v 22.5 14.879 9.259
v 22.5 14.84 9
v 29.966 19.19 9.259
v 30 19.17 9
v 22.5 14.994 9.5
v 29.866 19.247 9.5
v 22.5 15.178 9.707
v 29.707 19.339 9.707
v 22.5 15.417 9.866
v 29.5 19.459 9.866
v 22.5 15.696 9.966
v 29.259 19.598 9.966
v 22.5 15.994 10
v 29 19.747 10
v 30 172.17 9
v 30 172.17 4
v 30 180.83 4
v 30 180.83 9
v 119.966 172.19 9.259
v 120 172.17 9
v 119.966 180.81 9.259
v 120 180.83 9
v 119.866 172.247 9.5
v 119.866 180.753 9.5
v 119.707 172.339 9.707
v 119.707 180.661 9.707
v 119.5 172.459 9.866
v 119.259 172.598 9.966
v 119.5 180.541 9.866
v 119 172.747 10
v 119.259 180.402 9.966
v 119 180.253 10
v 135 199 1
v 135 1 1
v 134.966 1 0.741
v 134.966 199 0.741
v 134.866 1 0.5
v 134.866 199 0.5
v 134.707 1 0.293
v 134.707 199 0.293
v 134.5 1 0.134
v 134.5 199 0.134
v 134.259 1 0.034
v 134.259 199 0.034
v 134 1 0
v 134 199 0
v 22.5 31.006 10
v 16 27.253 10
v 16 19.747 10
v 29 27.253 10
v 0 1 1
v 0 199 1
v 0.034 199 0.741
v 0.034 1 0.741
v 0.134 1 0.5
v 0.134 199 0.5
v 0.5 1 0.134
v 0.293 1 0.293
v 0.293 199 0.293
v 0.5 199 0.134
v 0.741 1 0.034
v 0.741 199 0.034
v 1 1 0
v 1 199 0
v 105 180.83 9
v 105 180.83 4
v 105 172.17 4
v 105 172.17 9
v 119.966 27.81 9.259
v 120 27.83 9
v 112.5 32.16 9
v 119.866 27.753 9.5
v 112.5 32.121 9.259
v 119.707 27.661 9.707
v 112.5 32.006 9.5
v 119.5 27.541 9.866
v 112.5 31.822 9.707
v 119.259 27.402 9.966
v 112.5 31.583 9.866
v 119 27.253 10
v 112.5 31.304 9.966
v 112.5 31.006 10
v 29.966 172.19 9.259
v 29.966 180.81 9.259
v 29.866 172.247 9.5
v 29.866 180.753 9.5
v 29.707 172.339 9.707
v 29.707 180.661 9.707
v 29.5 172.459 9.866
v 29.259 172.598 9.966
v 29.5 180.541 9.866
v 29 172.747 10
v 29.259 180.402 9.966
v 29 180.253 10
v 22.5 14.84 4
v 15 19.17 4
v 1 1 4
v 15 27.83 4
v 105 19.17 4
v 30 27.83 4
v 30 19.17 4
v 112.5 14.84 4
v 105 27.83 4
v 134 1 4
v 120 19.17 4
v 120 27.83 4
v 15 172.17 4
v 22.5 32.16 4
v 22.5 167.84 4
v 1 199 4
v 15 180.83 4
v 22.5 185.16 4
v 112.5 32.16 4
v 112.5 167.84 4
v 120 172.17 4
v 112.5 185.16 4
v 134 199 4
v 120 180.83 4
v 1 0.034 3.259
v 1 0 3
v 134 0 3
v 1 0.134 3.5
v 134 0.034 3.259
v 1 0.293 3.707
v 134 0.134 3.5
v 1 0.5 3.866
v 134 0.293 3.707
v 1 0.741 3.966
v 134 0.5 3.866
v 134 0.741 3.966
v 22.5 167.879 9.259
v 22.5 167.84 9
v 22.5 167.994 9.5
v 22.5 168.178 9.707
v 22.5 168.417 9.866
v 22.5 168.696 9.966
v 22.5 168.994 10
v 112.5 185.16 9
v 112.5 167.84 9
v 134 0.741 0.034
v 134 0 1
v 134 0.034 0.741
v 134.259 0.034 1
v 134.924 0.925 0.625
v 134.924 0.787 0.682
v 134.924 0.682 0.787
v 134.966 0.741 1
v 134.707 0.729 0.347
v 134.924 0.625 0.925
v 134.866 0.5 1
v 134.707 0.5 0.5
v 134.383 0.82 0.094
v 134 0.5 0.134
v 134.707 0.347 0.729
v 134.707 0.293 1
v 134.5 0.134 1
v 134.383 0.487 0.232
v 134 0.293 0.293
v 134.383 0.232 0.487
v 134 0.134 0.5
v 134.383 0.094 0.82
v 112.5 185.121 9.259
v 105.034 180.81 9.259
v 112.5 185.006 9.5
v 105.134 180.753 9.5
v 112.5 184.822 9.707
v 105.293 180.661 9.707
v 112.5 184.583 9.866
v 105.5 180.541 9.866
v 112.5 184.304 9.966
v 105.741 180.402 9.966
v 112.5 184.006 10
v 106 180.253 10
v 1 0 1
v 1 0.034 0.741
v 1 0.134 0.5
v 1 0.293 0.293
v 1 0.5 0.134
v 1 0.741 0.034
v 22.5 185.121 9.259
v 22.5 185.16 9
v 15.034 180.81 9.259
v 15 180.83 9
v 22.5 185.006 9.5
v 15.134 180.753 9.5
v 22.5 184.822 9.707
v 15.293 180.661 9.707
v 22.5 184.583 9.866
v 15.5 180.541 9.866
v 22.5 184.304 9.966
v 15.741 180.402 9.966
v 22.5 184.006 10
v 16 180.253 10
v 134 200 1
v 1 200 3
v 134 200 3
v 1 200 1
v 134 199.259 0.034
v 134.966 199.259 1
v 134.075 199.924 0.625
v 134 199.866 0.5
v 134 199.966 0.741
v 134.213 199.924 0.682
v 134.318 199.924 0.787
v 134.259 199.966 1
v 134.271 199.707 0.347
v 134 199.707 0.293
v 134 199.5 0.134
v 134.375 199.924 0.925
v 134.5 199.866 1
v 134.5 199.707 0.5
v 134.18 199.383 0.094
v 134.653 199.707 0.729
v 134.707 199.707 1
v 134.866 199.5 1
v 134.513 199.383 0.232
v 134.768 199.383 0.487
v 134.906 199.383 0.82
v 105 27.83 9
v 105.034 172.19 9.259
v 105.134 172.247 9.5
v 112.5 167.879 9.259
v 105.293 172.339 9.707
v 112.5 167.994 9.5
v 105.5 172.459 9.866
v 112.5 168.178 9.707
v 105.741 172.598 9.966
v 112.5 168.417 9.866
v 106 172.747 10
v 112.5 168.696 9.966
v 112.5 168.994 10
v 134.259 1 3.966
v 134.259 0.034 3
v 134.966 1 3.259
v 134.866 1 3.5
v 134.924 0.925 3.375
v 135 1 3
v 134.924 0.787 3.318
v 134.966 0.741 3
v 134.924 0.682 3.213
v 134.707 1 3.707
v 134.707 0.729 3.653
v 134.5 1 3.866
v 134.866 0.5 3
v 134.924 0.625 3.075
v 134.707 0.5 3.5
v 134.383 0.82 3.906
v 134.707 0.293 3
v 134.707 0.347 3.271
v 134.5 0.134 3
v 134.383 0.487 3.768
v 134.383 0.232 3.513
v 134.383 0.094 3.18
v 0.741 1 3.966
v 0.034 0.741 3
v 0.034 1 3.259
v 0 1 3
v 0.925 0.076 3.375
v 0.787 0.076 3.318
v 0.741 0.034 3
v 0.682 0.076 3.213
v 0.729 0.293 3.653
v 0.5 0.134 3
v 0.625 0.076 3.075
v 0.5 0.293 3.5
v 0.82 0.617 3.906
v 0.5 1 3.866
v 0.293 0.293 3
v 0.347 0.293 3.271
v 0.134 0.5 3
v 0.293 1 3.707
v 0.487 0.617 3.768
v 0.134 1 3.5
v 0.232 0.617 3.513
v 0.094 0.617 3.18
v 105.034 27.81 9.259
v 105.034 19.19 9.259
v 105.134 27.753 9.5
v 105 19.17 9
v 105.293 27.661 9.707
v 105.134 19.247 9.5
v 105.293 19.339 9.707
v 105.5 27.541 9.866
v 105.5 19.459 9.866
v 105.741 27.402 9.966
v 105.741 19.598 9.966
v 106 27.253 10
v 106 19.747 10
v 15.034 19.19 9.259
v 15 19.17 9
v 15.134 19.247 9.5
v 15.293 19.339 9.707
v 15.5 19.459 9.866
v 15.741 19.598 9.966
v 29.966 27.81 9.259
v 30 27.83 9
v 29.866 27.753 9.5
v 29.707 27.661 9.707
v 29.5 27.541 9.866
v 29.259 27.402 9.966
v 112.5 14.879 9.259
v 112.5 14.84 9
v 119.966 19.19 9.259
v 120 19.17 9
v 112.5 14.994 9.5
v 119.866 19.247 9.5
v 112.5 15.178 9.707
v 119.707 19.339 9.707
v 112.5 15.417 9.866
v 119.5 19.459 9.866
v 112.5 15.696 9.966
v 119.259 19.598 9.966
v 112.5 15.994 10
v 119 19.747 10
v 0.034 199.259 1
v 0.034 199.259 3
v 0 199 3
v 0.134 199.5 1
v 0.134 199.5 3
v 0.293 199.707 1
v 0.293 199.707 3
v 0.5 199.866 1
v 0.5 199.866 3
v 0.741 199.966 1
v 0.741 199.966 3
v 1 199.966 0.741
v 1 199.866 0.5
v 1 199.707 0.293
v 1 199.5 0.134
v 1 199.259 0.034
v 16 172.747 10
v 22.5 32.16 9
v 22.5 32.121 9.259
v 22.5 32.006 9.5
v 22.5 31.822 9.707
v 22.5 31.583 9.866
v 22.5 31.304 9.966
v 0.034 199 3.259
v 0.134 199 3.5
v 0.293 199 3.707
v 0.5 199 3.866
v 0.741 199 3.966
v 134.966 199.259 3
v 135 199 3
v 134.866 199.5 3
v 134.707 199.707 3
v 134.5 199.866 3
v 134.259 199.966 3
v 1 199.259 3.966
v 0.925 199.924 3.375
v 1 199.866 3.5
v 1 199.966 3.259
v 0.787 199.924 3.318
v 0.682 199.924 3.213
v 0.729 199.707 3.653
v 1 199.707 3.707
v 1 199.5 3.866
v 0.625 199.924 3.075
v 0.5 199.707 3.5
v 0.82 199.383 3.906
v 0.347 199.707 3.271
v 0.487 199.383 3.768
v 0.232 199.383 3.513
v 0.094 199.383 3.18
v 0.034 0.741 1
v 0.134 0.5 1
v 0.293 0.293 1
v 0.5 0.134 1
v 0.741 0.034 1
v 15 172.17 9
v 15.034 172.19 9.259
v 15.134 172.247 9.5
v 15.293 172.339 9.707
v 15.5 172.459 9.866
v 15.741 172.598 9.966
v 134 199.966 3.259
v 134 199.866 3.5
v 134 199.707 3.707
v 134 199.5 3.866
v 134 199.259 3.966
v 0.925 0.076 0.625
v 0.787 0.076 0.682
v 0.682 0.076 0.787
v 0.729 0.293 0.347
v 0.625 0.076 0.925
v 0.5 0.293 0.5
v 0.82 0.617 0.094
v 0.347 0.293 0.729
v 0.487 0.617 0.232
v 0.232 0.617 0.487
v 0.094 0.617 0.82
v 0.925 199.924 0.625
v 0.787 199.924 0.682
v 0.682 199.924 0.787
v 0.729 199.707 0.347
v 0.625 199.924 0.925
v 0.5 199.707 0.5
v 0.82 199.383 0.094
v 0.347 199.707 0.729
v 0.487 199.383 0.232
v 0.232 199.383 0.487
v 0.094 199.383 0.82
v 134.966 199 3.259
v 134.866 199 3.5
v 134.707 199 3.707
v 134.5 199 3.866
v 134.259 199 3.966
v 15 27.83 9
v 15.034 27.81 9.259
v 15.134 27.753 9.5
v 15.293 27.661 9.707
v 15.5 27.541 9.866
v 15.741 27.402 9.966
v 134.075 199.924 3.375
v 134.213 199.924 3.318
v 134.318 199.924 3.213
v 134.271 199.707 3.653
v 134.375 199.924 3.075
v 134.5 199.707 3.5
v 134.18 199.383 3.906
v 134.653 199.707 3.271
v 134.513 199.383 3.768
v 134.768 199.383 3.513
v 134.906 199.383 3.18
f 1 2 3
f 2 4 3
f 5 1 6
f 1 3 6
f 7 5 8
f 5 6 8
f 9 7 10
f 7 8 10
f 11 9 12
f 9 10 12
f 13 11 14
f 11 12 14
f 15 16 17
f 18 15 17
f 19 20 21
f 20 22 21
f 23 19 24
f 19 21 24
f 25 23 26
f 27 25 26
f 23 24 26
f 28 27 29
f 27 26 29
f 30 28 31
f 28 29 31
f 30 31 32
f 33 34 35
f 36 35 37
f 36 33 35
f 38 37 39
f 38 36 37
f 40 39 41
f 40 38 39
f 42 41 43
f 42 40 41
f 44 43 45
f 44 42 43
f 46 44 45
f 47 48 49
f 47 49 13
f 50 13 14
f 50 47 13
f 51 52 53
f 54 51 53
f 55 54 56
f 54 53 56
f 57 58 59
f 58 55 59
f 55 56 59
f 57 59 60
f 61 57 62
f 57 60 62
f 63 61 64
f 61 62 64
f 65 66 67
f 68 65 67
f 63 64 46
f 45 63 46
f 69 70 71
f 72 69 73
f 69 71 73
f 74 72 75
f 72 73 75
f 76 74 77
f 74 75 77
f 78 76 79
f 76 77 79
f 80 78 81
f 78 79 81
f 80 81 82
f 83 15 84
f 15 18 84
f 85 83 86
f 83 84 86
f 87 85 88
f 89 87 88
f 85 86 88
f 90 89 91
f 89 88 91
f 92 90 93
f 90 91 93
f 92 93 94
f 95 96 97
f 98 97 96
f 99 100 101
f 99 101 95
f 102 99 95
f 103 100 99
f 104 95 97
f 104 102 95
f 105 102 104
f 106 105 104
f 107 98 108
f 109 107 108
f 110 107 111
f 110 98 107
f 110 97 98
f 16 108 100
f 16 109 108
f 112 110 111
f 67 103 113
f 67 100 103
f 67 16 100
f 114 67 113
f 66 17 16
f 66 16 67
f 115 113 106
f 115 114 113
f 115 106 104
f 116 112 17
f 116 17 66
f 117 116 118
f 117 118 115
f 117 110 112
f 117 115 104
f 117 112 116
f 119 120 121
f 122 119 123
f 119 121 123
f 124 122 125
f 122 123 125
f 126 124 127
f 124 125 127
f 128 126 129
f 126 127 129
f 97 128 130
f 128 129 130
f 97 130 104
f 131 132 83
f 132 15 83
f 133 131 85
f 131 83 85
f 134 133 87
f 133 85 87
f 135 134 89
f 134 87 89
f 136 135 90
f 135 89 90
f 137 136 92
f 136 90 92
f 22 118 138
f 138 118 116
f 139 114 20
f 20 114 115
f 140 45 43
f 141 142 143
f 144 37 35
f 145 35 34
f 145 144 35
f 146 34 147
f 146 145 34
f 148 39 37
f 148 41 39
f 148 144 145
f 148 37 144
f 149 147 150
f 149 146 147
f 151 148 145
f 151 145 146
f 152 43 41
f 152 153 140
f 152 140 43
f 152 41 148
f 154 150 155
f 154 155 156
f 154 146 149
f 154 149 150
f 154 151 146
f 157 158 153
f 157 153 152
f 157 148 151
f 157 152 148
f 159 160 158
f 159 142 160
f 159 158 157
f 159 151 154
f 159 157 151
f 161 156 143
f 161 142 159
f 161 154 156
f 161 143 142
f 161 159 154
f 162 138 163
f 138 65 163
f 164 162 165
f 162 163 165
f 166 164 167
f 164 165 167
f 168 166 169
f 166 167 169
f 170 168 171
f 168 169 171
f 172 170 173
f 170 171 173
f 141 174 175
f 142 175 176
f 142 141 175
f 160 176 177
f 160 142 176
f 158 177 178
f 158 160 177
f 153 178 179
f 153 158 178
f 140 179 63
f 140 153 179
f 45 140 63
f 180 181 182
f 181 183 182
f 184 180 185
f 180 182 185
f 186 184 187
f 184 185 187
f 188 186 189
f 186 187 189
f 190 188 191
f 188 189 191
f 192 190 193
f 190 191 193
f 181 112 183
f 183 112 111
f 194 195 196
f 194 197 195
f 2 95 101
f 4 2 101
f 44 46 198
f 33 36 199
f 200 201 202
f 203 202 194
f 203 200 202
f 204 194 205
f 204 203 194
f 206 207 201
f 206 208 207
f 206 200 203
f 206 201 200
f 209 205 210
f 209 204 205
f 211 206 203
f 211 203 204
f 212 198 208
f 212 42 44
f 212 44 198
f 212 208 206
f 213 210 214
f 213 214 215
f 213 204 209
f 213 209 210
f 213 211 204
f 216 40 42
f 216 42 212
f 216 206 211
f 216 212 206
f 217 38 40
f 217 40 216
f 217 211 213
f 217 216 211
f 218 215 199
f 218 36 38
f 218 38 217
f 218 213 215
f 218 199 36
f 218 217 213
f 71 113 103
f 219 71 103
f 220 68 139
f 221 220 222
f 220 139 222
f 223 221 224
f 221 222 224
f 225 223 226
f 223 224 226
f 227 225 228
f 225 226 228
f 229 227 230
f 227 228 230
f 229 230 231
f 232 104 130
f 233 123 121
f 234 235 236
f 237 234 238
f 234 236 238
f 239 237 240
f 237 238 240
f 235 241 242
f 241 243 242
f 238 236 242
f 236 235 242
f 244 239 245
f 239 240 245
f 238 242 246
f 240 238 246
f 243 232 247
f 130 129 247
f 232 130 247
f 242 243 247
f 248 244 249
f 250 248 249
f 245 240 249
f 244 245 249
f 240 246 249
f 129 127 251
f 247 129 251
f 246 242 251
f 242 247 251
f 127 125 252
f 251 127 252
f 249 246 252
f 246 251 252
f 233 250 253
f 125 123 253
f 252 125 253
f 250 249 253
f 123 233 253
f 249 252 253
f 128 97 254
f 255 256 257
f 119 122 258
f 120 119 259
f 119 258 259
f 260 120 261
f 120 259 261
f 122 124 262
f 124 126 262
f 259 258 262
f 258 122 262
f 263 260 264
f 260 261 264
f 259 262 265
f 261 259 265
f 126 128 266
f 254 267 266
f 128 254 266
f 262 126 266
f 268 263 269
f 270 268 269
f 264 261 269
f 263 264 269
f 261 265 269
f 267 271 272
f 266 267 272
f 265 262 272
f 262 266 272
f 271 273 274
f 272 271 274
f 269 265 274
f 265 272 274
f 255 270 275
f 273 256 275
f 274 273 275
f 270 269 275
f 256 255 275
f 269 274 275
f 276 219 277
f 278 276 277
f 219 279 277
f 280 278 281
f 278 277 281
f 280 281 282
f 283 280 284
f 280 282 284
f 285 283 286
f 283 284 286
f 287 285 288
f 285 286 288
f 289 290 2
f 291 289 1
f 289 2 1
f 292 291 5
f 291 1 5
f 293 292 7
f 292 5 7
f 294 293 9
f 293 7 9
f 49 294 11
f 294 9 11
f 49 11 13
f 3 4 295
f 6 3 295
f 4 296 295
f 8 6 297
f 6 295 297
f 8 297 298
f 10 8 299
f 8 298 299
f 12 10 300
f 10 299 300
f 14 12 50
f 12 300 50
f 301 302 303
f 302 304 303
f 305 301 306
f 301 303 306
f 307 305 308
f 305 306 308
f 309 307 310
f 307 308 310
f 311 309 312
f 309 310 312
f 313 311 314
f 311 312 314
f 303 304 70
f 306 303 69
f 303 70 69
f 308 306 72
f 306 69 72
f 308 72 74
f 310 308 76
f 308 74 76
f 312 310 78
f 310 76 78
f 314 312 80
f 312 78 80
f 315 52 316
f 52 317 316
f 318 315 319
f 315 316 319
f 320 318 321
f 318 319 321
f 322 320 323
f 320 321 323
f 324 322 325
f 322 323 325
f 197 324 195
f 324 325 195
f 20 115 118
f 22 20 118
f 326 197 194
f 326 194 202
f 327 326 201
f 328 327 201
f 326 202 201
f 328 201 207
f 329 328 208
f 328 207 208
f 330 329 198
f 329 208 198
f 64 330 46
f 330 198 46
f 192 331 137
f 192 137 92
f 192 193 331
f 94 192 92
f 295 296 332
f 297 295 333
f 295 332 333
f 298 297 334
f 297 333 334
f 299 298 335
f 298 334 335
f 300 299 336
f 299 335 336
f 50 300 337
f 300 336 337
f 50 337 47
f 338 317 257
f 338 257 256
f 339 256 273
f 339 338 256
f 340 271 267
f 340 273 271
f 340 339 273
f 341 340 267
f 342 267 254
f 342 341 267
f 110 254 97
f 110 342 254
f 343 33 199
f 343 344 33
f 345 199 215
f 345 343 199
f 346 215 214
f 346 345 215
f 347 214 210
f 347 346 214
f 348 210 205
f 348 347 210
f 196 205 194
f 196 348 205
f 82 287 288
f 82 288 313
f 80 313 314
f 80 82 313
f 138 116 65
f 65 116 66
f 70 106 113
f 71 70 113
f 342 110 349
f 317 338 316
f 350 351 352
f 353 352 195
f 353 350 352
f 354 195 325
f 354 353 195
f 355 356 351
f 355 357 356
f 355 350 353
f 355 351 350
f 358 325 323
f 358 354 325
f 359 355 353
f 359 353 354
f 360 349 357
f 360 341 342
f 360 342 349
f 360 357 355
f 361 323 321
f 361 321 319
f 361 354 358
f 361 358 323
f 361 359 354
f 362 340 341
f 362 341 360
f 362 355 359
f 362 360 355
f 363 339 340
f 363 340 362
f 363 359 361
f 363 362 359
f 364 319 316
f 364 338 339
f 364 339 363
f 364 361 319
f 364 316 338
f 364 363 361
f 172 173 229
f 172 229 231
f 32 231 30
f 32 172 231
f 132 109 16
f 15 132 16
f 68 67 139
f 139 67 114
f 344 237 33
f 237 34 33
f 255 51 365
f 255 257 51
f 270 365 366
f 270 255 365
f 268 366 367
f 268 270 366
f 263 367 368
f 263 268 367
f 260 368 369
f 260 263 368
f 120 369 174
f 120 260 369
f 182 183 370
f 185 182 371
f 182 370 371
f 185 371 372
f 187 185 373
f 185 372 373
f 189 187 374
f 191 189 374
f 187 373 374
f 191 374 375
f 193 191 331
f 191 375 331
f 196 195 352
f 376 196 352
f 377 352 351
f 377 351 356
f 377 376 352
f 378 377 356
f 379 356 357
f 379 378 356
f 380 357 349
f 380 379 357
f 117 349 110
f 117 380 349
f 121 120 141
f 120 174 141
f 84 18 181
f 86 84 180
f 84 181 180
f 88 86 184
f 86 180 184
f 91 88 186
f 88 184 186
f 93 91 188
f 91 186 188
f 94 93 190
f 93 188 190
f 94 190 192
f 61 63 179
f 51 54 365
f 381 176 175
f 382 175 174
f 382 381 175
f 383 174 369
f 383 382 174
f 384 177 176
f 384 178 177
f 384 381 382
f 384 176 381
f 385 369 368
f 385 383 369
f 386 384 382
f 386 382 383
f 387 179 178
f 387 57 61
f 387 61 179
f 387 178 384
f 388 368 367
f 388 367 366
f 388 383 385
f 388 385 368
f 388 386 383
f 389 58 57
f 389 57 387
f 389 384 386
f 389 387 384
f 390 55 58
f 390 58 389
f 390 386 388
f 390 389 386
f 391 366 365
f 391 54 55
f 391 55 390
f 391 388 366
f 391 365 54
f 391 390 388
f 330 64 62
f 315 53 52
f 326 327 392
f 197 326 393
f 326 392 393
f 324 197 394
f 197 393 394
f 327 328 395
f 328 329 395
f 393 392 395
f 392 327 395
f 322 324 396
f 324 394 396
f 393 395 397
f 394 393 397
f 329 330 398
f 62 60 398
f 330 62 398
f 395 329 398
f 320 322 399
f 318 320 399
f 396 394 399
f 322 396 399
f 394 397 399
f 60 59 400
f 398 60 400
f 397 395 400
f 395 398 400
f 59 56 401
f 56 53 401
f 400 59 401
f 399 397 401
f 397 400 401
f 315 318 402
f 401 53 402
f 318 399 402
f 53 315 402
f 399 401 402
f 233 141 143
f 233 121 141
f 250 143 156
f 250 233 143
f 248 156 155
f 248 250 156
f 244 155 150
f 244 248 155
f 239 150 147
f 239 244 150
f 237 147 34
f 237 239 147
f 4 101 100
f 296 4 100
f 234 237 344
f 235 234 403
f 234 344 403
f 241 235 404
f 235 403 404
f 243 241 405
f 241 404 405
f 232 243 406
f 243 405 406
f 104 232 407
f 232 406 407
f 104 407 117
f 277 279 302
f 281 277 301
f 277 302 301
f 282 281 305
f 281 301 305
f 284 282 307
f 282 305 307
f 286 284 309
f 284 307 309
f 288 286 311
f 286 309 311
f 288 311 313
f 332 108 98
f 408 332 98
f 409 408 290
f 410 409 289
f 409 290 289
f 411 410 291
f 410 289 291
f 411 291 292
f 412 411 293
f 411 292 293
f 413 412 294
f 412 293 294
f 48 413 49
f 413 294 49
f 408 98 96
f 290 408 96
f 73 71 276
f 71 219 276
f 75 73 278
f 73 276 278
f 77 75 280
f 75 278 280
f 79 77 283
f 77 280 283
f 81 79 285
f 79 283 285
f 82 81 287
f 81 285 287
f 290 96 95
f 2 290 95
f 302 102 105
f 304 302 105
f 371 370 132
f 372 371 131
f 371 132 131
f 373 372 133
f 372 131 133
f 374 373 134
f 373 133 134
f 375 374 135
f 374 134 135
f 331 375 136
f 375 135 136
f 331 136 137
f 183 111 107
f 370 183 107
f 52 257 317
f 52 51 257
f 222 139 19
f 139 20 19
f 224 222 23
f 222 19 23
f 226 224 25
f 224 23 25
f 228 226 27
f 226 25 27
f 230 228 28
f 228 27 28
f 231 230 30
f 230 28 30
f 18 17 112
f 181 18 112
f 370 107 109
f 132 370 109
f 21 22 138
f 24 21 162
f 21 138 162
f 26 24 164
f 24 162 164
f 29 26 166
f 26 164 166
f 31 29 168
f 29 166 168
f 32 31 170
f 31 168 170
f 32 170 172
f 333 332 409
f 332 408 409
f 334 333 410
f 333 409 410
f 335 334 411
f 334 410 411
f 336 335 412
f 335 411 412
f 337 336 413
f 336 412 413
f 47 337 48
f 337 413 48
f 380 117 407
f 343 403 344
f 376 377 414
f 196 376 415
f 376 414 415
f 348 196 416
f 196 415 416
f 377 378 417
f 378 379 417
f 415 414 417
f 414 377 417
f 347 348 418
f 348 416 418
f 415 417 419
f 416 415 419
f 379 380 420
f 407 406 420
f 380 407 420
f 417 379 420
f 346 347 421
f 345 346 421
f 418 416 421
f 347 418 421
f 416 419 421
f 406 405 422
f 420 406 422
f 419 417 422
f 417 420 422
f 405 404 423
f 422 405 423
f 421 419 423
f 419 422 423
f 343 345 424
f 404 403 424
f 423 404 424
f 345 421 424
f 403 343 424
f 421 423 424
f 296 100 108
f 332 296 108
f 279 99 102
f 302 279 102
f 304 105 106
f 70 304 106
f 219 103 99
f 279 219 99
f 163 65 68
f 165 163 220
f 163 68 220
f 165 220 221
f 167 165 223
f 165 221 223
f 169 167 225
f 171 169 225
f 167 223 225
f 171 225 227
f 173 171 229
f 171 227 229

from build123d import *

# Parameters (mm, degrees)
F0_W     = 135
F0_H     = 200
F1_DEPTH = 4
F2_R     = 1
F4_DEPTH = 6
F5_R     = 1


with BuildPart() as f1:
    # F0 (on Top) → F1 (new body)
    with BuildSketch(Plane.XY):
        with Locations((67.5, 100)):
            Rectangle(F0_W, F0_H)
    extrude(amount=F1_DEPTH)

    # F2
    f2_edges = [f1.edges().sort_by_distance(p)[0] for p in [
        (0, 100, 4),
        (67.5, 0, 4),
        (135, 100, 4),
        (67.5, 200, 4),
        (0, 100, 0),
        (67.5, 0, 0),
        (135, 100, 0),
        (67.5, 200, 0),
        (135, 0, 2),
        (0, 0, 2),
        (135, 200, 2),
        (0, 200, 2),
    ]]
    fillet(f2_edges, radius=F2_R)

    # F3 (on face) → F4 (join)
    with BuildSketch(Plane.XY.offset(4)):
        Polygon((22.5, 167.839746), (30, 172.169873), (30, 180.830127), (22.5, 185.160254), (15, 180.830127), (15, 172.169873), align=None)
        Polygon((120, 180.830127), (112.5, 185.160254), (105, 180.830127), (105, 172.169873), (112.5, 167.839746), (120, 172.169873), align=None)
        Polygon((30, 19.169873), (30, 27.830127), (22.5, 32.160254), (15, 27.830127), (15, 19.169873), (22.5, 14.839746), align=None)
        Polygon((105, 19.169873), (112.5, 14.839746), (120, 19.169873), (120, 27.830127), (112.5, 32.160254), (105, 27.830127), align=None)
    extrude(amount=F4_DEPTH)

    # F5
    f5_edges = [f1.edges().sort_by_distance(p)[0] for p in [
        (18.75, 170.004809, 10),
        (26.25, 170.004809, 10),
        (30, 176.5, 10),
        (26.25, 182.995191, 10),
        (18.75, 182.995191, 10),
        (15, 176.5, 10),
        (120, 176.5, 10),
        (116.25, 182.995191, 10),
        (108.75, 182.995191, 10),
        (105, 176.5, 10),
        (108.75, 170.004809, 10),
        (116.25, 170.004809, 10),
        (108.75, 29.995191, 10),
        (105, 23.5, 10),
        (108.75, 17.004809, 10),
        (116.25, 17.004809, 10),
        (120, 23.5, 10),
        (116.25, 29.995191, 10),
        (26.25, 17.004809, 10),
        (30, 23.5, 10),
        (26.25, 29.995191, 10),
        (18.75, 29.995191, 10),
        (15, 23.5, 10),
        (18.75, 17.004809, 10),
    ]]
    fillet(f5_edges, radius=F5_R)


solid = f1.part
